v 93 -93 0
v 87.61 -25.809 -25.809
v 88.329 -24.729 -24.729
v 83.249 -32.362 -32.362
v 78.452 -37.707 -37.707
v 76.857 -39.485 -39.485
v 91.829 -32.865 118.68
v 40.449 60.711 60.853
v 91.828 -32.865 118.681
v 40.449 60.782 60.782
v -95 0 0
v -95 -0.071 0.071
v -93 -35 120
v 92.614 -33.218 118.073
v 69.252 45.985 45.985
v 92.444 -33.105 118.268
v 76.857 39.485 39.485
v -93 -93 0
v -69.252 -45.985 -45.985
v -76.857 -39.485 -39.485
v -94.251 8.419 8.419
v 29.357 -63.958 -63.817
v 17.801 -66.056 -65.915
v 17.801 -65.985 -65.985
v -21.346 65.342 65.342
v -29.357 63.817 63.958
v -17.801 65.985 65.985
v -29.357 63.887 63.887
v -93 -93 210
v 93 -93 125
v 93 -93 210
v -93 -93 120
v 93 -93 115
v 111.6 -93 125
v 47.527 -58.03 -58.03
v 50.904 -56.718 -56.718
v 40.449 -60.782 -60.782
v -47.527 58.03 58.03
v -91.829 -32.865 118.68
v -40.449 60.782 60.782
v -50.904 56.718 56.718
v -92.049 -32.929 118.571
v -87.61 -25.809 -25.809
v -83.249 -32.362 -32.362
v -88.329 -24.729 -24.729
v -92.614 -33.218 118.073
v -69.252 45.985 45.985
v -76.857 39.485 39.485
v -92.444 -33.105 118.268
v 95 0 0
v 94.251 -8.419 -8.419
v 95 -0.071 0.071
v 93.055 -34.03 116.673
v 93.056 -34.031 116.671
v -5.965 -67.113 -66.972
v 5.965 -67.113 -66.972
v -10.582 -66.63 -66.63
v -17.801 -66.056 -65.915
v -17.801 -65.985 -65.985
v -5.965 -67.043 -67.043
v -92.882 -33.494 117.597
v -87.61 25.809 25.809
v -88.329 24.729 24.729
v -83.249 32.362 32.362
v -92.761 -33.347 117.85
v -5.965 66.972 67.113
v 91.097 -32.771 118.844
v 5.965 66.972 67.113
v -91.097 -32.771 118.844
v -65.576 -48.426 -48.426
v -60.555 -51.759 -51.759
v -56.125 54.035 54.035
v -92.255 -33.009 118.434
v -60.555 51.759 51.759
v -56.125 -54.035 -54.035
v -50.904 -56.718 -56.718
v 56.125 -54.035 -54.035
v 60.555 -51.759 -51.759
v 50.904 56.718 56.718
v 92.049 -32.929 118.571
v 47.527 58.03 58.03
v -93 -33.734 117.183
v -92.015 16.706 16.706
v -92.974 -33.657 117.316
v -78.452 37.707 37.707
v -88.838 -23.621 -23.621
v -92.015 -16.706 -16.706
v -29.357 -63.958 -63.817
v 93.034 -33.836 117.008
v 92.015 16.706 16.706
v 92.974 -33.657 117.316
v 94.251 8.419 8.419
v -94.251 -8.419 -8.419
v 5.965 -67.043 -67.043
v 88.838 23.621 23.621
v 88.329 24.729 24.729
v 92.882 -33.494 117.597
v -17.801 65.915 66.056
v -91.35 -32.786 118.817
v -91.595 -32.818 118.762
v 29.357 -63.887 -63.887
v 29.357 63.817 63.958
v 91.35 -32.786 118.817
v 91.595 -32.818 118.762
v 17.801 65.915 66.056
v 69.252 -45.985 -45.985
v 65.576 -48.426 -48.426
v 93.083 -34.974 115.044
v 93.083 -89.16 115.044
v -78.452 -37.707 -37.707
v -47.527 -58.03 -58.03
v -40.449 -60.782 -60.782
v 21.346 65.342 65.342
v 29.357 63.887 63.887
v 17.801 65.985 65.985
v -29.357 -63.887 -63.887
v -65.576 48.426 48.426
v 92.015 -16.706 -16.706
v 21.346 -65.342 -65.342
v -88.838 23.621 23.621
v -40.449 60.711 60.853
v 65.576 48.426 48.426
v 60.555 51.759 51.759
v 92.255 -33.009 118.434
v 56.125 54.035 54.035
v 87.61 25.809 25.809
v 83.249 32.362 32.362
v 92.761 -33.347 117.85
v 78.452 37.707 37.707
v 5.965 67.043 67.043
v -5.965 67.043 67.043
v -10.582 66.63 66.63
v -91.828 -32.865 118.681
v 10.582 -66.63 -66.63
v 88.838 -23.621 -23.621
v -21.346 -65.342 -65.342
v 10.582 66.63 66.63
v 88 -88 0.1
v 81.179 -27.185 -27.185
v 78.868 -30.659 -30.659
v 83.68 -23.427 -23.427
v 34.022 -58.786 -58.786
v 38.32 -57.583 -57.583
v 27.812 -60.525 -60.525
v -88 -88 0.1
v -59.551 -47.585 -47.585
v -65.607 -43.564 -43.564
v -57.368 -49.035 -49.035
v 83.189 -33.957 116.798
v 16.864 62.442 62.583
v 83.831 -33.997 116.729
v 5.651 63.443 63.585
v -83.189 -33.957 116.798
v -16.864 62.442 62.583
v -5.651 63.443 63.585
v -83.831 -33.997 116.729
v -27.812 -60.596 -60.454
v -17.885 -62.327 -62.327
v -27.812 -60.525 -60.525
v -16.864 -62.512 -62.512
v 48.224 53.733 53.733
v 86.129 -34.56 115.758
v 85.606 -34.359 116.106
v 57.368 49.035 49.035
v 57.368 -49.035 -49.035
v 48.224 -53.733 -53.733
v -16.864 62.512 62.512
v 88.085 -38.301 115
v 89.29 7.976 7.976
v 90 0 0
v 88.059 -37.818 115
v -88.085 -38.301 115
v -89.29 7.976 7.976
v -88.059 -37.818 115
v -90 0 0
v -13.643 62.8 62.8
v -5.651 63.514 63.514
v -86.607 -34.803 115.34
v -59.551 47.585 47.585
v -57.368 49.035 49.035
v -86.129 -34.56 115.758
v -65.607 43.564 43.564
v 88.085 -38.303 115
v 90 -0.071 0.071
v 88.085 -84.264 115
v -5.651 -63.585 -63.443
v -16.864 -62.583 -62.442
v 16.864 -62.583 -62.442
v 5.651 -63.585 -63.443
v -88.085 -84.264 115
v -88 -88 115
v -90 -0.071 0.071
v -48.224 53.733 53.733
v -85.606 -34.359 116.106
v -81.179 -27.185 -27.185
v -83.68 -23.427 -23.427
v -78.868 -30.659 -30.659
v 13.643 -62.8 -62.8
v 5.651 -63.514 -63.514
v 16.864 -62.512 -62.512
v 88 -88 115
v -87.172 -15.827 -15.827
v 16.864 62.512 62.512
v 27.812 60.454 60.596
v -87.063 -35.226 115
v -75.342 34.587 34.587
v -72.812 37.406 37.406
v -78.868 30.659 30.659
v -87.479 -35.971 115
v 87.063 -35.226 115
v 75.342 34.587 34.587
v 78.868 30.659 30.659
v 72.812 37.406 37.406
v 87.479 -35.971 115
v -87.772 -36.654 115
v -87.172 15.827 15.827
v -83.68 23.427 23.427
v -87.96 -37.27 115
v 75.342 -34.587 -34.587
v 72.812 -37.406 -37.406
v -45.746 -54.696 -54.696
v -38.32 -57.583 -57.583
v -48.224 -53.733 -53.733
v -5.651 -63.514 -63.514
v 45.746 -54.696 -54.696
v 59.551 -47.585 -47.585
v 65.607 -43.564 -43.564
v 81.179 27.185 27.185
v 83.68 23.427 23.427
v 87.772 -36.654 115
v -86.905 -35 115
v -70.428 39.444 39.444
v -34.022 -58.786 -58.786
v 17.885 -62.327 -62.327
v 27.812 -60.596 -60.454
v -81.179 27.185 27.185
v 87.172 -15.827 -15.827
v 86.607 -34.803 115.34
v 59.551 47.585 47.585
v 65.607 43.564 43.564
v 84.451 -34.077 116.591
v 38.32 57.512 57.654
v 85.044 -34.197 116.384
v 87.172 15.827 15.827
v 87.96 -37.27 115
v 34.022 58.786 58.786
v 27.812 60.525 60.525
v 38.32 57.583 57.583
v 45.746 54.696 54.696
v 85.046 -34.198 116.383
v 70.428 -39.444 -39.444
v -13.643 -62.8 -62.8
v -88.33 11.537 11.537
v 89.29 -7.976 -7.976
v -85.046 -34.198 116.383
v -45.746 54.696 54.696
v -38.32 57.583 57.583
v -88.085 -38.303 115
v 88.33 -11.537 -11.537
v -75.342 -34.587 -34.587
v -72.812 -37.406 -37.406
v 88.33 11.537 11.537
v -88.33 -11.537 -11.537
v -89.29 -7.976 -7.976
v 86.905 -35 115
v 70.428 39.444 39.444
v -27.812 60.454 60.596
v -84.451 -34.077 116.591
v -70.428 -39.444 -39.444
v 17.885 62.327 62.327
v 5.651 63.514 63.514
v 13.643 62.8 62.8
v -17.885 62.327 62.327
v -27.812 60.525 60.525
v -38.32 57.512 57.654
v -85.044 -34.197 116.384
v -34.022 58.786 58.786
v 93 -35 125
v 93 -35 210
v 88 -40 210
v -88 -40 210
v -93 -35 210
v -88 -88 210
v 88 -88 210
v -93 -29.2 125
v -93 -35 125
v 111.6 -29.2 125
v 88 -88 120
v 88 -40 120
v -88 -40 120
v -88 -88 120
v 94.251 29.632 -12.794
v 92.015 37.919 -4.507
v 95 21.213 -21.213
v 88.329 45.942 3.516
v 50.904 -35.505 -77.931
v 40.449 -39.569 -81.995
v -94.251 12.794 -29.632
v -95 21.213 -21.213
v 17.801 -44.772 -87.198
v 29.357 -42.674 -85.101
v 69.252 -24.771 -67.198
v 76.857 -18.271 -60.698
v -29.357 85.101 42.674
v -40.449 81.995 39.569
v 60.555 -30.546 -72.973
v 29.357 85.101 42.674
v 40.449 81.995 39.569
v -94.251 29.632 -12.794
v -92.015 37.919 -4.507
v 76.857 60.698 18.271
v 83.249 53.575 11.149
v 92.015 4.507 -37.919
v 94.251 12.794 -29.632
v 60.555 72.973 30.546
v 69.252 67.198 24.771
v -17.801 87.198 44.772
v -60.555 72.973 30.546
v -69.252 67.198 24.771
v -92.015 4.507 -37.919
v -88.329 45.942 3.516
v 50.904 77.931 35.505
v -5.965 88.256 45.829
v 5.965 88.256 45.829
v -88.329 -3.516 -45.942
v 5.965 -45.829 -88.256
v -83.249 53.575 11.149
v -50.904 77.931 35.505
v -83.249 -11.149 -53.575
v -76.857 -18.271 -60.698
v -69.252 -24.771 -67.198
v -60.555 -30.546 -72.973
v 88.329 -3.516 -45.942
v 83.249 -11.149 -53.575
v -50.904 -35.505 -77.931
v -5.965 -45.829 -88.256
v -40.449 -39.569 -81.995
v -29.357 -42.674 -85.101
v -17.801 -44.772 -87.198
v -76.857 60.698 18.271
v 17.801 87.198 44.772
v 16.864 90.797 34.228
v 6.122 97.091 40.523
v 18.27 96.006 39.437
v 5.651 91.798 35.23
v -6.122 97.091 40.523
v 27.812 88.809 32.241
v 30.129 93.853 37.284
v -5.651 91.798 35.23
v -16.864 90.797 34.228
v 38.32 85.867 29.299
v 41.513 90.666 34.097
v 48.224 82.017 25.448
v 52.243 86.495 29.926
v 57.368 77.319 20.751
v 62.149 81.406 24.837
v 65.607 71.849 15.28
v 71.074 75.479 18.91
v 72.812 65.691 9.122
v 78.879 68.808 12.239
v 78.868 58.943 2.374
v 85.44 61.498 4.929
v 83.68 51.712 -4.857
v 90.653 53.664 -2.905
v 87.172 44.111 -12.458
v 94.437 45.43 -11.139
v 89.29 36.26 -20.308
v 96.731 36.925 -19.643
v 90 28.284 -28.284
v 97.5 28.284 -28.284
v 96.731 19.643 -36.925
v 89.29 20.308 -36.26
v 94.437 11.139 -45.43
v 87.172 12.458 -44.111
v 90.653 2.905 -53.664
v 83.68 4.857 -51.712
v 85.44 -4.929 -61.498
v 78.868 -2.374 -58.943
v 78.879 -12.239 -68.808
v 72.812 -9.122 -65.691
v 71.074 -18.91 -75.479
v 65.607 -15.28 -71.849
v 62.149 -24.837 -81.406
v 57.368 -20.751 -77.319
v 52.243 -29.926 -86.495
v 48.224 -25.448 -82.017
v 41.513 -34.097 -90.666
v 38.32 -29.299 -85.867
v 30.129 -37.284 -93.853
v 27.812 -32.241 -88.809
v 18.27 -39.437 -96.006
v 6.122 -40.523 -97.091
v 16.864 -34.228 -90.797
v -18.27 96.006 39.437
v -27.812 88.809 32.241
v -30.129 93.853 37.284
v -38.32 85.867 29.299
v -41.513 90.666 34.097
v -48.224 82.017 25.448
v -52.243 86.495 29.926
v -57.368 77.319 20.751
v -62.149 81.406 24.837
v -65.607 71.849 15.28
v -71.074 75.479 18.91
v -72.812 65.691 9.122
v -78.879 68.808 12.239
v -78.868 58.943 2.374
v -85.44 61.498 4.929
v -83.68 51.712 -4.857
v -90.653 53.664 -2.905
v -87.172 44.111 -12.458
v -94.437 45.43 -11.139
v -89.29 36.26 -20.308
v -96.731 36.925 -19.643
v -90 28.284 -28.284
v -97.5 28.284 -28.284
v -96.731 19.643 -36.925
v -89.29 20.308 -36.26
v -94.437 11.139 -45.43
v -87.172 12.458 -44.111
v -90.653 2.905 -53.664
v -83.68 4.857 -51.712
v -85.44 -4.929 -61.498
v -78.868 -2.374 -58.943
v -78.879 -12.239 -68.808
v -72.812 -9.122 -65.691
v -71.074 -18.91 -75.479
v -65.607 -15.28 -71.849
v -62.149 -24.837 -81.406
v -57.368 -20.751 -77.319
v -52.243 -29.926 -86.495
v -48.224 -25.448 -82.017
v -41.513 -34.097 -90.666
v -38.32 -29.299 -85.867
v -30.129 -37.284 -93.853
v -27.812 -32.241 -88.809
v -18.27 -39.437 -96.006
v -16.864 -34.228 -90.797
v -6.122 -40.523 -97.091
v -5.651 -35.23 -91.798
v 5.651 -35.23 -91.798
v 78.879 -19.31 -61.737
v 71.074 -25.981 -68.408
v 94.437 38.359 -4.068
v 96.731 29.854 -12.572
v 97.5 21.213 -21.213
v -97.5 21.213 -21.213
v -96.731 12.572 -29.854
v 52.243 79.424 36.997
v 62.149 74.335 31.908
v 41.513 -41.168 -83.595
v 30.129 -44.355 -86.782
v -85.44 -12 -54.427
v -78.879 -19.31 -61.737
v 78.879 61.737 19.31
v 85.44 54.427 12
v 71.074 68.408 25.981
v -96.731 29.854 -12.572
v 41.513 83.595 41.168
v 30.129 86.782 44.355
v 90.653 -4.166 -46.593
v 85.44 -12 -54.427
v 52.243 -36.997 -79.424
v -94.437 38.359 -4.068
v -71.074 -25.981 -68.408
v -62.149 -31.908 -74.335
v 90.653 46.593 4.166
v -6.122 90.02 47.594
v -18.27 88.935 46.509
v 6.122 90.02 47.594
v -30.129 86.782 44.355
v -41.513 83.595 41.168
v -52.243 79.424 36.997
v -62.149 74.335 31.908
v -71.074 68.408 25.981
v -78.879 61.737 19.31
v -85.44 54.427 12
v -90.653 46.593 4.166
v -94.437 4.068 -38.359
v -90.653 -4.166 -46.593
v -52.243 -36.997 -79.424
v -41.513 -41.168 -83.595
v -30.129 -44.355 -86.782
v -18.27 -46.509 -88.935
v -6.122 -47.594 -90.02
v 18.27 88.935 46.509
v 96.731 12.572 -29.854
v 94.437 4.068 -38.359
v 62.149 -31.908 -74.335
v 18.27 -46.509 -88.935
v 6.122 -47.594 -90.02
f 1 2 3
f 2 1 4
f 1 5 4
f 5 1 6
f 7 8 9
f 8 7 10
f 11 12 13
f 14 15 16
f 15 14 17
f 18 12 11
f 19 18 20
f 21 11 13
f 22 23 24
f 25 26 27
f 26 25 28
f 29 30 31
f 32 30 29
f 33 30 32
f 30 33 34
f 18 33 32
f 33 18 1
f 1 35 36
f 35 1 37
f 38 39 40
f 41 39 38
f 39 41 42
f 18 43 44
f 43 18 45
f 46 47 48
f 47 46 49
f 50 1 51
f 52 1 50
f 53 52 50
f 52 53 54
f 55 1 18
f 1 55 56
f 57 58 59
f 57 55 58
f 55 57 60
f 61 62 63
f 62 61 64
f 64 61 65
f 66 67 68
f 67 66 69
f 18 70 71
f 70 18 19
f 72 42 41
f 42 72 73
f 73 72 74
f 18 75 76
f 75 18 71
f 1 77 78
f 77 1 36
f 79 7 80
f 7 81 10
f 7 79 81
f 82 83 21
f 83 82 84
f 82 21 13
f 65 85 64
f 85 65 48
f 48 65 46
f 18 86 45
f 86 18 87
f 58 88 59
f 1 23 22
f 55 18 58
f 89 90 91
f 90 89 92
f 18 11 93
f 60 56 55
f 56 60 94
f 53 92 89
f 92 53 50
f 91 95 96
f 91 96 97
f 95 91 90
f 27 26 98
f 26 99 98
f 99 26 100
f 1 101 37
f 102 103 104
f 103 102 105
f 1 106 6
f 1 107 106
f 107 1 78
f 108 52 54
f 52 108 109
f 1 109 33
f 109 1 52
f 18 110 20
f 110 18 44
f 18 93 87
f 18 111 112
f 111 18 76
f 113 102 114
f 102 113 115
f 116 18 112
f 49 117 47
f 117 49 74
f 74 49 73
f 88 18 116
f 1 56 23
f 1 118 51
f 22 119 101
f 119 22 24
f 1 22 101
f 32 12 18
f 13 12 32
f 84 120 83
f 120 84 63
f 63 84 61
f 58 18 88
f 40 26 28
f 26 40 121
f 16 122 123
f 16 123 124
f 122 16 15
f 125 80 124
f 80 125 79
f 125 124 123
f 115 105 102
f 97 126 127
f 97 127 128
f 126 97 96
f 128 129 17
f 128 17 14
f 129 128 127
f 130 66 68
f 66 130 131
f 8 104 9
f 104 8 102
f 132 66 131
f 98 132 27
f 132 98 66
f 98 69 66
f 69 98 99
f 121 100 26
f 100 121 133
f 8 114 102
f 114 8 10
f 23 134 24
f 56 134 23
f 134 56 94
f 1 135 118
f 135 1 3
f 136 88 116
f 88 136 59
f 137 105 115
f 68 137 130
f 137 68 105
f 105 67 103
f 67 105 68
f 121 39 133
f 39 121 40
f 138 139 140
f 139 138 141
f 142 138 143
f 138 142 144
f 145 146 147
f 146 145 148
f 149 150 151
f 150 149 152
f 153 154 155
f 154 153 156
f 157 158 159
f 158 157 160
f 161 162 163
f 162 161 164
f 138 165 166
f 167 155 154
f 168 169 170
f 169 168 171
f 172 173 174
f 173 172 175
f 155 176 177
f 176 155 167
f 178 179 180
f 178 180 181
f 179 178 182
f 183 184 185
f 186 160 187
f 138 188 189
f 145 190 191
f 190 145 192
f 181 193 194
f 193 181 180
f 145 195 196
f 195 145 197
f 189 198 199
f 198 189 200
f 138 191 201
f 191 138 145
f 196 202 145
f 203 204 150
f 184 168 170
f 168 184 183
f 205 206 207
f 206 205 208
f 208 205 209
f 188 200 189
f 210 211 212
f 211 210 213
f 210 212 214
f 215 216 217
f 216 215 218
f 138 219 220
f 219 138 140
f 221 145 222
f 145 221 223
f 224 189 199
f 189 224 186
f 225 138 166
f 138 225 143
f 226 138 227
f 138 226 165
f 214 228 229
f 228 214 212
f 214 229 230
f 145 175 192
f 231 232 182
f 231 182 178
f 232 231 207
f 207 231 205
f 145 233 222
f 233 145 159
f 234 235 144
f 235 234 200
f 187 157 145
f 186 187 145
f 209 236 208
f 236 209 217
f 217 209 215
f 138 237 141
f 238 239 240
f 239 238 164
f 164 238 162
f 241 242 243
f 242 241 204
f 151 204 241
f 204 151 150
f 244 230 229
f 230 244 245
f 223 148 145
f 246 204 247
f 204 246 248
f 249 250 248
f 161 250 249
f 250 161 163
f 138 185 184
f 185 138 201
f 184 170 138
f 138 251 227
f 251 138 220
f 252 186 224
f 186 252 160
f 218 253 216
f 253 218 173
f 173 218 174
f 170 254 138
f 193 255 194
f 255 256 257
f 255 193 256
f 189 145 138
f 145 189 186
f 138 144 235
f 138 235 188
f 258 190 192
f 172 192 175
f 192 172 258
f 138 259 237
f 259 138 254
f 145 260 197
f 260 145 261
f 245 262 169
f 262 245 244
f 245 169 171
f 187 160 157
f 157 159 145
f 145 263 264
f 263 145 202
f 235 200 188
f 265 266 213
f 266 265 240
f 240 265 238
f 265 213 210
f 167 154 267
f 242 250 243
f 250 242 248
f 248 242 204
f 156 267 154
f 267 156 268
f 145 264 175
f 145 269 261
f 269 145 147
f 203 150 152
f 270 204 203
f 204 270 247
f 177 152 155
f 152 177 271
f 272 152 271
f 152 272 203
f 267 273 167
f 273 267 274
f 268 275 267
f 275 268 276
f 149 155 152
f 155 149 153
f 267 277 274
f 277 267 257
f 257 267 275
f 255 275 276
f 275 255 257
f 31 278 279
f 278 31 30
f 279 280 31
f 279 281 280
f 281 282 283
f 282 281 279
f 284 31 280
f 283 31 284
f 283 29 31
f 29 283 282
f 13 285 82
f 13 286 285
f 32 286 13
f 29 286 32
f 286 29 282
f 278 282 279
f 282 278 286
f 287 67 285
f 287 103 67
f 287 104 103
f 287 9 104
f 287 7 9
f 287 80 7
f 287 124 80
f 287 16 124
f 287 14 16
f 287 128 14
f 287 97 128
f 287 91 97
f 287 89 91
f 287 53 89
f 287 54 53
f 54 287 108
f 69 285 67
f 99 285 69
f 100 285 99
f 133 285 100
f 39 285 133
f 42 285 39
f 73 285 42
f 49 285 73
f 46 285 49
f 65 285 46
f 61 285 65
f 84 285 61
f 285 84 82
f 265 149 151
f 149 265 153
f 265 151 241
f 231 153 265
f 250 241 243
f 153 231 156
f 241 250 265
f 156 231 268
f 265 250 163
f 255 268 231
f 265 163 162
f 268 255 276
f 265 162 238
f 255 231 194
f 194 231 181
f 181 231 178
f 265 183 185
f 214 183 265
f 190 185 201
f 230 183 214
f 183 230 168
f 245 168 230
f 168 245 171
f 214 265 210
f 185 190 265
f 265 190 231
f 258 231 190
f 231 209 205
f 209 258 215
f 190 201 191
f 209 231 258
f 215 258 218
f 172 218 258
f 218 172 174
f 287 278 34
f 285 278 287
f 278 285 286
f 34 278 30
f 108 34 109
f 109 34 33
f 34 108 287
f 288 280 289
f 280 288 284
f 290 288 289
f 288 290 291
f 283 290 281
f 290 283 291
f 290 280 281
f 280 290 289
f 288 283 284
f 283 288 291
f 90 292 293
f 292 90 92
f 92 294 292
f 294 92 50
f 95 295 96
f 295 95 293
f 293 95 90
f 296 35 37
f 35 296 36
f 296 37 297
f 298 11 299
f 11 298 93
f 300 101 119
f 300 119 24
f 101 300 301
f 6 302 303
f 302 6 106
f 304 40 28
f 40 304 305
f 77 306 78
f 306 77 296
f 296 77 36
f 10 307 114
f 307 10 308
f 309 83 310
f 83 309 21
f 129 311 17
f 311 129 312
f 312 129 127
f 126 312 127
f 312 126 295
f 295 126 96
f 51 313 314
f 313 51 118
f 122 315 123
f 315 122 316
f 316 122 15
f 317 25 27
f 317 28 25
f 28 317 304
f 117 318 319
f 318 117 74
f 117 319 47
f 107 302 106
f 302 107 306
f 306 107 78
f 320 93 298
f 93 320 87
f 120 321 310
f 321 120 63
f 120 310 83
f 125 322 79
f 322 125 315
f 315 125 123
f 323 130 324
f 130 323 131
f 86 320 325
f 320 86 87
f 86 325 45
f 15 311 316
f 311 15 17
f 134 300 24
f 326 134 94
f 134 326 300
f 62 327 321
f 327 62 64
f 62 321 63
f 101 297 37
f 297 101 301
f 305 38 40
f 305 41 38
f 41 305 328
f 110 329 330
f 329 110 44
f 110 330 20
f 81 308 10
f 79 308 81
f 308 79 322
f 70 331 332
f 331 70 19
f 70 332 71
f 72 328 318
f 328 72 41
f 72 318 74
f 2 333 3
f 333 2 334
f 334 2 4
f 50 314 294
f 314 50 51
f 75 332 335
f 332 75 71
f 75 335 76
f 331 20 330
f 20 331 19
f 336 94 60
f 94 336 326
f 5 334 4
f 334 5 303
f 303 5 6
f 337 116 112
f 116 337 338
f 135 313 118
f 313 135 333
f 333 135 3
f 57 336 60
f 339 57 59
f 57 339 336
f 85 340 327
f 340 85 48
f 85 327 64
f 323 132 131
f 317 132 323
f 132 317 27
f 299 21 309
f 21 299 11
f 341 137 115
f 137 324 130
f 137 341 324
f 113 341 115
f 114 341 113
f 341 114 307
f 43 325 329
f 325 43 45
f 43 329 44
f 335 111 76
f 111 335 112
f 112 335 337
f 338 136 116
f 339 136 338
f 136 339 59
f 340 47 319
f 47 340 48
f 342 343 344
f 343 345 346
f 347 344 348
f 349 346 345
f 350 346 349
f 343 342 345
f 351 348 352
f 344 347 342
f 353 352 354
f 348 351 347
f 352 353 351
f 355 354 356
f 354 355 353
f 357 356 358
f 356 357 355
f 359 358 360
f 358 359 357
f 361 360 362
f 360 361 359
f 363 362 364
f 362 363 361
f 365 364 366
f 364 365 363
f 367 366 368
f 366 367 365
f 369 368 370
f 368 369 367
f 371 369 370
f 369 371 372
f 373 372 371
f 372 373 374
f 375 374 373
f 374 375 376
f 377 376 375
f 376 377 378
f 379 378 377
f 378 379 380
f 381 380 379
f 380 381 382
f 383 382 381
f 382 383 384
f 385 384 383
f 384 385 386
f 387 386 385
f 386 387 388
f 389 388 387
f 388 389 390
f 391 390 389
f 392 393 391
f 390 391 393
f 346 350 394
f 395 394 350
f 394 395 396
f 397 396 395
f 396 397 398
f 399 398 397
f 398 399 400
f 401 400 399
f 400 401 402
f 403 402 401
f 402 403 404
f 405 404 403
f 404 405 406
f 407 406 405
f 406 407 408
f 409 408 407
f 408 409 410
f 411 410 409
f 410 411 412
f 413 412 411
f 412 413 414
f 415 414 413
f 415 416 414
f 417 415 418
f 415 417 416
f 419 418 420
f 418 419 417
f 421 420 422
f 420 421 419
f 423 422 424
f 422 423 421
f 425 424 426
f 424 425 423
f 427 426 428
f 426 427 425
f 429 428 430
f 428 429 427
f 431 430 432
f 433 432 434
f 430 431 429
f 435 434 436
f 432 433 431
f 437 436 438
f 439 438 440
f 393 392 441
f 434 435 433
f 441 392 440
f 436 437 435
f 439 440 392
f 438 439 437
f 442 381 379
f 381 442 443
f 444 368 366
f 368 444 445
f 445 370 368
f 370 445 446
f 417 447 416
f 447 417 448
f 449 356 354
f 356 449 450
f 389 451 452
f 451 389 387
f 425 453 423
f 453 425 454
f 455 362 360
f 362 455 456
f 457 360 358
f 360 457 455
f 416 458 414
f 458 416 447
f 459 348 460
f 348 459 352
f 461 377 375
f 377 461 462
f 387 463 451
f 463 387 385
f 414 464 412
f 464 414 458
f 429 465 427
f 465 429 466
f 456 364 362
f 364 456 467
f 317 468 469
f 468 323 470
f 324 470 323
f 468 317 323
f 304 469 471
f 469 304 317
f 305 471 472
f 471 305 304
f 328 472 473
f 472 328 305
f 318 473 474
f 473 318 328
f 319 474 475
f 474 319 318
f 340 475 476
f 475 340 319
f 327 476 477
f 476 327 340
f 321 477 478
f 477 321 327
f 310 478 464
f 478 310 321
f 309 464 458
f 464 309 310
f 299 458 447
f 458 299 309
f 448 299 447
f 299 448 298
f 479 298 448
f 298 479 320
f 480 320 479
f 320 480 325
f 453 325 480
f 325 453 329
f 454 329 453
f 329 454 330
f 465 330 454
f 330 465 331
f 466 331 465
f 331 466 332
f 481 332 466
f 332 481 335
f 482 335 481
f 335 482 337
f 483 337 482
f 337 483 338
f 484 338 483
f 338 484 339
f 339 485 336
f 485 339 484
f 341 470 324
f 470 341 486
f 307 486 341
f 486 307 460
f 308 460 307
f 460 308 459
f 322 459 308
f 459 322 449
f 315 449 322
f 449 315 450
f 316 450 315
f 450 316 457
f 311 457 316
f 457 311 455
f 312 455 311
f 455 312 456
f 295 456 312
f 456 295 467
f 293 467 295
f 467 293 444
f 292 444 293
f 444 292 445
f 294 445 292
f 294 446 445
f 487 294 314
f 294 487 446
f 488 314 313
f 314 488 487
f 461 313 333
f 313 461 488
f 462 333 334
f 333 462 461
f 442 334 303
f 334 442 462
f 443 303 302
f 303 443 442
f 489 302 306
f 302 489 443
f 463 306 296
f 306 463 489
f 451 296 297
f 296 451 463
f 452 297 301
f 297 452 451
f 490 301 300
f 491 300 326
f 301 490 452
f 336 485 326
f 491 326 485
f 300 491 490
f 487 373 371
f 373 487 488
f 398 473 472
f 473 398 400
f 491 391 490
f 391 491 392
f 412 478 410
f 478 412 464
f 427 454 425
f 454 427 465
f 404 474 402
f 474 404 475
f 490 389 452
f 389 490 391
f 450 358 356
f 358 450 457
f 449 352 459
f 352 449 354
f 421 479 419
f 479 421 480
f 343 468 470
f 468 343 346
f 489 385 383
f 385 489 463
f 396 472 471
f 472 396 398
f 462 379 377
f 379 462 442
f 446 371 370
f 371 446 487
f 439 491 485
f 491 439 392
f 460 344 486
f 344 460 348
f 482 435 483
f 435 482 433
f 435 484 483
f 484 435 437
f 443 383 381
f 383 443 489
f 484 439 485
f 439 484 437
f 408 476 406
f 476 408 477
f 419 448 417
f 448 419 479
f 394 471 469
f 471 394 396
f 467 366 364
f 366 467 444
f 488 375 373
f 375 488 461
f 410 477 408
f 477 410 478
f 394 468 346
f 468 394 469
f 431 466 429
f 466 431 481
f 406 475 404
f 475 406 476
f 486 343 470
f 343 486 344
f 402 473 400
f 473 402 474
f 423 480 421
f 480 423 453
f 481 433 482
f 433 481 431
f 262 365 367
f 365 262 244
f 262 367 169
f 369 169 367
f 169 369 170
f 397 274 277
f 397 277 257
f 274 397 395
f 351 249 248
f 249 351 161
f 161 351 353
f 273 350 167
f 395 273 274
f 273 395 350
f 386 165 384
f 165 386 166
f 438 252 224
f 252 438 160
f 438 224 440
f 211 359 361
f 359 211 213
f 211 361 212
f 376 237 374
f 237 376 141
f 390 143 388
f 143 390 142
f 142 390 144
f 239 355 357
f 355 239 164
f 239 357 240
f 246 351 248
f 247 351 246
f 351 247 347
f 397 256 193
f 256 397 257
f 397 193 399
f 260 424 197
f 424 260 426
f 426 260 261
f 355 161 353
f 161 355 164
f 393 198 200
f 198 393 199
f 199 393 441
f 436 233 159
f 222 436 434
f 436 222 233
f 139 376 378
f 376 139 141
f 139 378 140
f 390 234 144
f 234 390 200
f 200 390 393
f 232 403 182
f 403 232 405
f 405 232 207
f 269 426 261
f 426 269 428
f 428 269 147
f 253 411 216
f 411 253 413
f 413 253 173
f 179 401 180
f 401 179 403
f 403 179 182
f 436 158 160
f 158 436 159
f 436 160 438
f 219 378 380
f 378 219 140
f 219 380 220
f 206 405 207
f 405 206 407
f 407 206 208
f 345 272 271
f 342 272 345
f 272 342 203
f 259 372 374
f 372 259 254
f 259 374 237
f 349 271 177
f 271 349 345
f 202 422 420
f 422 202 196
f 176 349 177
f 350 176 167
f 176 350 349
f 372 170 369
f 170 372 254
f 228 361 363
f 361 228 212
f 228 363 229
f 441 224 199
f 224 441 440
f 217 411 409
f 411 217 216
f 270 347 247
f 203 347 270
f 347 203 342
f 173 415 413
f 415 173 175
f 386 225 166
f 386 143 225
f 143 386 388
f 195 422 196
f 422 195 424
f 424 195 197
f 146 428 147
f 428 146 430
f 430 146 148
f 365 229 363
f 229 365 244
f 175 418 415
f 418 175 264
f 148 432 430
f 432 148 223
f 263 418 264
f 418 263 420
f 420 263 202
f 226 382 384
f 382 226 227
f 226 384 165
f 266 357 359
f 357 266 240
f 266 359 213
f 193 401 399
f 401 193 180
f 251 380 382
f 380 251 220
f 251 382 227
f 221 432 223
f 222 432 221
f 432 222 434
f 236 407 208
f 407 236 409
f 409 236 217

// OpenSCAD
d = 180;
h = 120;
l = 176;
L = 48;
s = 5;
$fn = 50;
difference(){
    hull(){
        rotate([45,0,0]) cylinder( d = d+2*s, h = 0.1);
        translate([-(l+2*s)/2,-L-s-40,0]) cube([l+2*s,L+2*s,h], center = false);  
    } 
    hull(){
        rotate([45,0,0]) cylinder( d = d, h = 0.1);
        translate([-l/2,-L-40,0.1]) cube([l,L,h], center = false);  
    } 
}
difference(){
    union(){
        translate([-(l+2*s)/2,-L-s-40,h]){
            cube([l+2*s,L+2*s,90]);
            linear_extrude(height=10, center = true, scale = [1.1,1.1])
                square([l+2*s,L+2*s]);
            linear_extrude(height=10, center = true, scale = [1.1,1.1])
                square([l+2*s,L+2*s]);
        }
    }
    translate([-l/2,-L-40,h]) cube([l,L,100]);
}
rotate([45,0,0])
difference(){
    union(){
        translate([0,0,-40]) cylinder(d = d+2*s, h = 40);
        translate([0,0,-40]) cylinder(d = d+3*s, h = 10);
    }
    translate([0,0,-40]) cylinder(d = d, h = 40);
 }
